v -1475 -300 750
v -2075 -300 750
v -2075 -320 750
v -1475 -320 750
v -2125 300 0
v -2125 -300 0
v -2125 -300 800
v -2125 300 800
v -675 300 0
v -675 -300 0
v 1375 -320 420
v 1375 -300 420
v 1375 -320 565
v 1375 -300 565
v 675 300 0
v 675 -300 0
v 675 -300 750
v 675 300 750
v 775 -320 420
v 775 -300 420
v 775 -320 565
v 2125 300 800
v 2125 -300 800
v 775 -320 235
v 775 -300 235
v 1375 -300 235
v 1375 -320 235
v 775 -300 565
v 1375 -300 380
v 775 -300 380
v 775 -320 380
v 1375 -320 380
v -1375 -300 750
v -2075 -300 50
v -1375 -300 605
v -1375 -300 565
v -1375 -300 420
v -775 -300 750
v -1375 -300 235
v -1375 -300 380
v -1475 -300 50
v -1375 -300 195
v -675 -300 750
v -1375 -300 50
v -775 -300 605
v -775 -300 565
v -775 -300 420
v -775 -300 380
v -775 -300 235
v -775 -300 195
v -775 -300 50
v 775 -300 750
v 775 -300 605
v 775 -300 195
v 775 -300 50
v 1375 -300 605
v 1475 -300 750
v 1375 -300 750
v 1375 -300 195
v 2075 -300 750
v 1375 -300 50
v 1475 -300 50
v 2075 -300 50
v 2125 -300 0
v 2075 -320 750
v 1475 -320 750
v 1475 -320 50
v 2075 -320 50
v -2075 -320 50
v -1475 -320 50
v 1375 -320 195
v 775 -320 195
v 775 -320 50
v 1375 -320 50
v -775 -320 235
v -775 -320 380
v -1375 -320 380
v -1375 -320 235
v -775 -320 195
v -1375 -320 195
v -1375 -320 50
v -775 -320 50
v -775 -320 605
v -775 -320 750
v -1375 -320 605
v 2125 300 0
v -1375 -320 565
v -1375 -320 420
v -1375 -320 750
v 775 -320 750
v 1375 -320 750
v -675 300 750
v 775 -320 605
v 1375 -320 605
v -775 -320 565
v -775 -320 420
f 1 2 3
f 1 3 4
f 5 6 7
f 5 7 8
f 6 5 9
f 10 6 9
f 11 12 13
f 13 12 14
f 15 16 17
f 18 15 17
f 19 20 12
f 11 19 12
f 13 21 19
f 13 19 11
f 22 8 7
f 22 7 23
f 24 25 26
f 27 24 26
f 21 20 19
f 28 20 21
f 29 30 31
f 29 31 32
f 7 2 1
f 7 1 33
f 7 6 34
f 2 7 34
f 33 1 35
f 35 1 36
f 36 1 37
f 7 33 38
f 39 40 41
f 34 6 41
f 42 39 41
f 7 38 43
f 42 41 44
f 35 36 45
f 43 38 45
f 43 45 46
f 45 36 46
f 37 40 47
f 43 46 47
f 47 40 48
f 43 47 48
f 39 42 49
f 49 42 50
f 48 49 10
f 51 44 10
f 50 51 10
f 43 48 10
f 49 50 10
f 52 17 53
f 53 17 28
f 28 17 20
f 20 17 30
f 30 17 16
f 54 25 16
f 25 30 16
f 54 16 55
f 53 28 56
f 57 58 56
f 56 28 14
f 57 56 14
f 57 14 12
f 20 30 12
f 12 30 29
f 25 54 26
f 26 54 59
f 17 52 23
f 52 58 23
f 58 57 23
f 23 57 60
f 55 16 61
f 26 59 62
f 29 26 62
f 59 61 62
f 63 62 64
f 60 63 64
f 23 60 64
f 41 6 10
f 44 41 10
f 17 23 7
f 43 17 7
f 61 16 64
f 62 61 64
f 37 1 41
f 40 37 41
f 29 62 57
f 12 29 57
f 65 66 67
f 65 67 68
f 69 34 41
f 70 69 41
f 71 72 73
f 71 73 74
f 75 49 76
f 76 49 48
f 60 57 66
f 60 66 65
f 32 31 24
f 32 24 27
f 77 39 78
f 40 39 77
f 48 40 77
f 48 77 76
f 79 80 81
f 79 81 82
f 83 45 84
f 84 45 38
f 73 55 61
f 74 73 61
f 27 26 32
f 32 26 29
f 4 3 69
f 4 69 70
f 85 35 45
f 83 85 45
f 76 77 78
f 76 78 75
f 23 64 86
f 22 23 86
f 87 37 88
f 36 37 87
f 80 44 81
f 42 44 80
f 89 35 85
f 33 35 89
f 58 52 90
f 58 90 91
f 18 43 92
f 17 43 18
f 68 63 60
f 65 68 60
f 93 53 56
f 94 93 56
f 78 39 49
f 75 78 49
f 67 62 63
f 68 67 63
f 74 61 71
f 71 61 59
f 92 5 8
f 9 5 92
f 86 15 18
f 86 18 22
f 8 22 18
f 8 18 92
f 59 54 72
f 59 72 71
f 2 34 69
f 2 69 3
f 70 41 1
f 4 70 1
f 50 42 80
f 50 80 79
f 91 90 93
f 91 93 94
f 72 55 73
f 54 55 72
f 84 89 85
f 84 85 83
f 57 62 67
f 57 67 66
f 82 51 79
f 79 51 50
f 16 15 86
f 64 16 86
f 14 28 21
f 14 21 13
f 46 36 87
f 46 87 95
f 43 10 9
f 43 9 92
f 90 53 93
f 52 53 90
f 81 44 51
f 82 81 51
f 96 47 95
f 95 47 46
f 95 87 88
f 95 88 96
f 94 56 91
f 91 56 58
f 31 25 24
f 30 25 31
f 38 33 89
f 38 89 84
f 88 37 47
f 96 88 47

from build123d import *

# Parameters (mm, degrees)
F0_W     = 4250
F0_H     = 600
F1_DEPTH = 800
F2_W     = 600
F2_H     = 700
F2_H_2   = 145
F3_DEPTH = 20
F2_W_2   = 1350
F2_H_3   = 750
F4_DEPTH = 700


with BuildPart() as f1:
    # F0 (on Top) → F1 (new body)
    with BuildSketch(Plane.XY):
        Rectangle(F0_W, F0_H)
    extrude(amount=F1_DEPTH)

    # F2 (on face) → F3 (join)
    with BuildSketch(Plane.XZ.offset(300)):
        with Locations((-1775, 400)):
            Rectangle(F2_W, F2_H)
        with Locations((-1075, 677.5)):
            Rectangle(F2_W, F2_H_2)
        with Locations((-1075, 492.5)):
            Rectangle(F2_W, F2_H_2)
        with Locations((-1075, 307.5)):
            Rectangle(F2_W, F2_H_2)
        with Locations((-1075, 122.5)):
            Rectangle(F2_W, F2_H_2)
        with Locations((1075, 677.5)):
            Rectangle(F2_W, F2_H_2)
        with Locations((1075, 492.5)):
            Rectangle(F2_W, F2_H_2)
        with Locations((1075, 307.5)):
            Rectangle(F2_W, F2_H_2)
        with Locations((1075, 122.5)):
            Rectangle(F2_W, F2_H_2)
        with Locations((1775, 400)):
            Rectangle(F2_W, F2_H)
    extrude(amount=F3_DEPTH)

    # F2 (on face) → F4 (cut)
    with BuildSketch(Plane.XZ.offset(300)):
        with Locations((0, 375)):
            Rectangle(F2_W_2, F2_H_3)
    extrude(amount=-F4_DEPTH, mode=Mode.SUBTRACT)


solid = f1.part
